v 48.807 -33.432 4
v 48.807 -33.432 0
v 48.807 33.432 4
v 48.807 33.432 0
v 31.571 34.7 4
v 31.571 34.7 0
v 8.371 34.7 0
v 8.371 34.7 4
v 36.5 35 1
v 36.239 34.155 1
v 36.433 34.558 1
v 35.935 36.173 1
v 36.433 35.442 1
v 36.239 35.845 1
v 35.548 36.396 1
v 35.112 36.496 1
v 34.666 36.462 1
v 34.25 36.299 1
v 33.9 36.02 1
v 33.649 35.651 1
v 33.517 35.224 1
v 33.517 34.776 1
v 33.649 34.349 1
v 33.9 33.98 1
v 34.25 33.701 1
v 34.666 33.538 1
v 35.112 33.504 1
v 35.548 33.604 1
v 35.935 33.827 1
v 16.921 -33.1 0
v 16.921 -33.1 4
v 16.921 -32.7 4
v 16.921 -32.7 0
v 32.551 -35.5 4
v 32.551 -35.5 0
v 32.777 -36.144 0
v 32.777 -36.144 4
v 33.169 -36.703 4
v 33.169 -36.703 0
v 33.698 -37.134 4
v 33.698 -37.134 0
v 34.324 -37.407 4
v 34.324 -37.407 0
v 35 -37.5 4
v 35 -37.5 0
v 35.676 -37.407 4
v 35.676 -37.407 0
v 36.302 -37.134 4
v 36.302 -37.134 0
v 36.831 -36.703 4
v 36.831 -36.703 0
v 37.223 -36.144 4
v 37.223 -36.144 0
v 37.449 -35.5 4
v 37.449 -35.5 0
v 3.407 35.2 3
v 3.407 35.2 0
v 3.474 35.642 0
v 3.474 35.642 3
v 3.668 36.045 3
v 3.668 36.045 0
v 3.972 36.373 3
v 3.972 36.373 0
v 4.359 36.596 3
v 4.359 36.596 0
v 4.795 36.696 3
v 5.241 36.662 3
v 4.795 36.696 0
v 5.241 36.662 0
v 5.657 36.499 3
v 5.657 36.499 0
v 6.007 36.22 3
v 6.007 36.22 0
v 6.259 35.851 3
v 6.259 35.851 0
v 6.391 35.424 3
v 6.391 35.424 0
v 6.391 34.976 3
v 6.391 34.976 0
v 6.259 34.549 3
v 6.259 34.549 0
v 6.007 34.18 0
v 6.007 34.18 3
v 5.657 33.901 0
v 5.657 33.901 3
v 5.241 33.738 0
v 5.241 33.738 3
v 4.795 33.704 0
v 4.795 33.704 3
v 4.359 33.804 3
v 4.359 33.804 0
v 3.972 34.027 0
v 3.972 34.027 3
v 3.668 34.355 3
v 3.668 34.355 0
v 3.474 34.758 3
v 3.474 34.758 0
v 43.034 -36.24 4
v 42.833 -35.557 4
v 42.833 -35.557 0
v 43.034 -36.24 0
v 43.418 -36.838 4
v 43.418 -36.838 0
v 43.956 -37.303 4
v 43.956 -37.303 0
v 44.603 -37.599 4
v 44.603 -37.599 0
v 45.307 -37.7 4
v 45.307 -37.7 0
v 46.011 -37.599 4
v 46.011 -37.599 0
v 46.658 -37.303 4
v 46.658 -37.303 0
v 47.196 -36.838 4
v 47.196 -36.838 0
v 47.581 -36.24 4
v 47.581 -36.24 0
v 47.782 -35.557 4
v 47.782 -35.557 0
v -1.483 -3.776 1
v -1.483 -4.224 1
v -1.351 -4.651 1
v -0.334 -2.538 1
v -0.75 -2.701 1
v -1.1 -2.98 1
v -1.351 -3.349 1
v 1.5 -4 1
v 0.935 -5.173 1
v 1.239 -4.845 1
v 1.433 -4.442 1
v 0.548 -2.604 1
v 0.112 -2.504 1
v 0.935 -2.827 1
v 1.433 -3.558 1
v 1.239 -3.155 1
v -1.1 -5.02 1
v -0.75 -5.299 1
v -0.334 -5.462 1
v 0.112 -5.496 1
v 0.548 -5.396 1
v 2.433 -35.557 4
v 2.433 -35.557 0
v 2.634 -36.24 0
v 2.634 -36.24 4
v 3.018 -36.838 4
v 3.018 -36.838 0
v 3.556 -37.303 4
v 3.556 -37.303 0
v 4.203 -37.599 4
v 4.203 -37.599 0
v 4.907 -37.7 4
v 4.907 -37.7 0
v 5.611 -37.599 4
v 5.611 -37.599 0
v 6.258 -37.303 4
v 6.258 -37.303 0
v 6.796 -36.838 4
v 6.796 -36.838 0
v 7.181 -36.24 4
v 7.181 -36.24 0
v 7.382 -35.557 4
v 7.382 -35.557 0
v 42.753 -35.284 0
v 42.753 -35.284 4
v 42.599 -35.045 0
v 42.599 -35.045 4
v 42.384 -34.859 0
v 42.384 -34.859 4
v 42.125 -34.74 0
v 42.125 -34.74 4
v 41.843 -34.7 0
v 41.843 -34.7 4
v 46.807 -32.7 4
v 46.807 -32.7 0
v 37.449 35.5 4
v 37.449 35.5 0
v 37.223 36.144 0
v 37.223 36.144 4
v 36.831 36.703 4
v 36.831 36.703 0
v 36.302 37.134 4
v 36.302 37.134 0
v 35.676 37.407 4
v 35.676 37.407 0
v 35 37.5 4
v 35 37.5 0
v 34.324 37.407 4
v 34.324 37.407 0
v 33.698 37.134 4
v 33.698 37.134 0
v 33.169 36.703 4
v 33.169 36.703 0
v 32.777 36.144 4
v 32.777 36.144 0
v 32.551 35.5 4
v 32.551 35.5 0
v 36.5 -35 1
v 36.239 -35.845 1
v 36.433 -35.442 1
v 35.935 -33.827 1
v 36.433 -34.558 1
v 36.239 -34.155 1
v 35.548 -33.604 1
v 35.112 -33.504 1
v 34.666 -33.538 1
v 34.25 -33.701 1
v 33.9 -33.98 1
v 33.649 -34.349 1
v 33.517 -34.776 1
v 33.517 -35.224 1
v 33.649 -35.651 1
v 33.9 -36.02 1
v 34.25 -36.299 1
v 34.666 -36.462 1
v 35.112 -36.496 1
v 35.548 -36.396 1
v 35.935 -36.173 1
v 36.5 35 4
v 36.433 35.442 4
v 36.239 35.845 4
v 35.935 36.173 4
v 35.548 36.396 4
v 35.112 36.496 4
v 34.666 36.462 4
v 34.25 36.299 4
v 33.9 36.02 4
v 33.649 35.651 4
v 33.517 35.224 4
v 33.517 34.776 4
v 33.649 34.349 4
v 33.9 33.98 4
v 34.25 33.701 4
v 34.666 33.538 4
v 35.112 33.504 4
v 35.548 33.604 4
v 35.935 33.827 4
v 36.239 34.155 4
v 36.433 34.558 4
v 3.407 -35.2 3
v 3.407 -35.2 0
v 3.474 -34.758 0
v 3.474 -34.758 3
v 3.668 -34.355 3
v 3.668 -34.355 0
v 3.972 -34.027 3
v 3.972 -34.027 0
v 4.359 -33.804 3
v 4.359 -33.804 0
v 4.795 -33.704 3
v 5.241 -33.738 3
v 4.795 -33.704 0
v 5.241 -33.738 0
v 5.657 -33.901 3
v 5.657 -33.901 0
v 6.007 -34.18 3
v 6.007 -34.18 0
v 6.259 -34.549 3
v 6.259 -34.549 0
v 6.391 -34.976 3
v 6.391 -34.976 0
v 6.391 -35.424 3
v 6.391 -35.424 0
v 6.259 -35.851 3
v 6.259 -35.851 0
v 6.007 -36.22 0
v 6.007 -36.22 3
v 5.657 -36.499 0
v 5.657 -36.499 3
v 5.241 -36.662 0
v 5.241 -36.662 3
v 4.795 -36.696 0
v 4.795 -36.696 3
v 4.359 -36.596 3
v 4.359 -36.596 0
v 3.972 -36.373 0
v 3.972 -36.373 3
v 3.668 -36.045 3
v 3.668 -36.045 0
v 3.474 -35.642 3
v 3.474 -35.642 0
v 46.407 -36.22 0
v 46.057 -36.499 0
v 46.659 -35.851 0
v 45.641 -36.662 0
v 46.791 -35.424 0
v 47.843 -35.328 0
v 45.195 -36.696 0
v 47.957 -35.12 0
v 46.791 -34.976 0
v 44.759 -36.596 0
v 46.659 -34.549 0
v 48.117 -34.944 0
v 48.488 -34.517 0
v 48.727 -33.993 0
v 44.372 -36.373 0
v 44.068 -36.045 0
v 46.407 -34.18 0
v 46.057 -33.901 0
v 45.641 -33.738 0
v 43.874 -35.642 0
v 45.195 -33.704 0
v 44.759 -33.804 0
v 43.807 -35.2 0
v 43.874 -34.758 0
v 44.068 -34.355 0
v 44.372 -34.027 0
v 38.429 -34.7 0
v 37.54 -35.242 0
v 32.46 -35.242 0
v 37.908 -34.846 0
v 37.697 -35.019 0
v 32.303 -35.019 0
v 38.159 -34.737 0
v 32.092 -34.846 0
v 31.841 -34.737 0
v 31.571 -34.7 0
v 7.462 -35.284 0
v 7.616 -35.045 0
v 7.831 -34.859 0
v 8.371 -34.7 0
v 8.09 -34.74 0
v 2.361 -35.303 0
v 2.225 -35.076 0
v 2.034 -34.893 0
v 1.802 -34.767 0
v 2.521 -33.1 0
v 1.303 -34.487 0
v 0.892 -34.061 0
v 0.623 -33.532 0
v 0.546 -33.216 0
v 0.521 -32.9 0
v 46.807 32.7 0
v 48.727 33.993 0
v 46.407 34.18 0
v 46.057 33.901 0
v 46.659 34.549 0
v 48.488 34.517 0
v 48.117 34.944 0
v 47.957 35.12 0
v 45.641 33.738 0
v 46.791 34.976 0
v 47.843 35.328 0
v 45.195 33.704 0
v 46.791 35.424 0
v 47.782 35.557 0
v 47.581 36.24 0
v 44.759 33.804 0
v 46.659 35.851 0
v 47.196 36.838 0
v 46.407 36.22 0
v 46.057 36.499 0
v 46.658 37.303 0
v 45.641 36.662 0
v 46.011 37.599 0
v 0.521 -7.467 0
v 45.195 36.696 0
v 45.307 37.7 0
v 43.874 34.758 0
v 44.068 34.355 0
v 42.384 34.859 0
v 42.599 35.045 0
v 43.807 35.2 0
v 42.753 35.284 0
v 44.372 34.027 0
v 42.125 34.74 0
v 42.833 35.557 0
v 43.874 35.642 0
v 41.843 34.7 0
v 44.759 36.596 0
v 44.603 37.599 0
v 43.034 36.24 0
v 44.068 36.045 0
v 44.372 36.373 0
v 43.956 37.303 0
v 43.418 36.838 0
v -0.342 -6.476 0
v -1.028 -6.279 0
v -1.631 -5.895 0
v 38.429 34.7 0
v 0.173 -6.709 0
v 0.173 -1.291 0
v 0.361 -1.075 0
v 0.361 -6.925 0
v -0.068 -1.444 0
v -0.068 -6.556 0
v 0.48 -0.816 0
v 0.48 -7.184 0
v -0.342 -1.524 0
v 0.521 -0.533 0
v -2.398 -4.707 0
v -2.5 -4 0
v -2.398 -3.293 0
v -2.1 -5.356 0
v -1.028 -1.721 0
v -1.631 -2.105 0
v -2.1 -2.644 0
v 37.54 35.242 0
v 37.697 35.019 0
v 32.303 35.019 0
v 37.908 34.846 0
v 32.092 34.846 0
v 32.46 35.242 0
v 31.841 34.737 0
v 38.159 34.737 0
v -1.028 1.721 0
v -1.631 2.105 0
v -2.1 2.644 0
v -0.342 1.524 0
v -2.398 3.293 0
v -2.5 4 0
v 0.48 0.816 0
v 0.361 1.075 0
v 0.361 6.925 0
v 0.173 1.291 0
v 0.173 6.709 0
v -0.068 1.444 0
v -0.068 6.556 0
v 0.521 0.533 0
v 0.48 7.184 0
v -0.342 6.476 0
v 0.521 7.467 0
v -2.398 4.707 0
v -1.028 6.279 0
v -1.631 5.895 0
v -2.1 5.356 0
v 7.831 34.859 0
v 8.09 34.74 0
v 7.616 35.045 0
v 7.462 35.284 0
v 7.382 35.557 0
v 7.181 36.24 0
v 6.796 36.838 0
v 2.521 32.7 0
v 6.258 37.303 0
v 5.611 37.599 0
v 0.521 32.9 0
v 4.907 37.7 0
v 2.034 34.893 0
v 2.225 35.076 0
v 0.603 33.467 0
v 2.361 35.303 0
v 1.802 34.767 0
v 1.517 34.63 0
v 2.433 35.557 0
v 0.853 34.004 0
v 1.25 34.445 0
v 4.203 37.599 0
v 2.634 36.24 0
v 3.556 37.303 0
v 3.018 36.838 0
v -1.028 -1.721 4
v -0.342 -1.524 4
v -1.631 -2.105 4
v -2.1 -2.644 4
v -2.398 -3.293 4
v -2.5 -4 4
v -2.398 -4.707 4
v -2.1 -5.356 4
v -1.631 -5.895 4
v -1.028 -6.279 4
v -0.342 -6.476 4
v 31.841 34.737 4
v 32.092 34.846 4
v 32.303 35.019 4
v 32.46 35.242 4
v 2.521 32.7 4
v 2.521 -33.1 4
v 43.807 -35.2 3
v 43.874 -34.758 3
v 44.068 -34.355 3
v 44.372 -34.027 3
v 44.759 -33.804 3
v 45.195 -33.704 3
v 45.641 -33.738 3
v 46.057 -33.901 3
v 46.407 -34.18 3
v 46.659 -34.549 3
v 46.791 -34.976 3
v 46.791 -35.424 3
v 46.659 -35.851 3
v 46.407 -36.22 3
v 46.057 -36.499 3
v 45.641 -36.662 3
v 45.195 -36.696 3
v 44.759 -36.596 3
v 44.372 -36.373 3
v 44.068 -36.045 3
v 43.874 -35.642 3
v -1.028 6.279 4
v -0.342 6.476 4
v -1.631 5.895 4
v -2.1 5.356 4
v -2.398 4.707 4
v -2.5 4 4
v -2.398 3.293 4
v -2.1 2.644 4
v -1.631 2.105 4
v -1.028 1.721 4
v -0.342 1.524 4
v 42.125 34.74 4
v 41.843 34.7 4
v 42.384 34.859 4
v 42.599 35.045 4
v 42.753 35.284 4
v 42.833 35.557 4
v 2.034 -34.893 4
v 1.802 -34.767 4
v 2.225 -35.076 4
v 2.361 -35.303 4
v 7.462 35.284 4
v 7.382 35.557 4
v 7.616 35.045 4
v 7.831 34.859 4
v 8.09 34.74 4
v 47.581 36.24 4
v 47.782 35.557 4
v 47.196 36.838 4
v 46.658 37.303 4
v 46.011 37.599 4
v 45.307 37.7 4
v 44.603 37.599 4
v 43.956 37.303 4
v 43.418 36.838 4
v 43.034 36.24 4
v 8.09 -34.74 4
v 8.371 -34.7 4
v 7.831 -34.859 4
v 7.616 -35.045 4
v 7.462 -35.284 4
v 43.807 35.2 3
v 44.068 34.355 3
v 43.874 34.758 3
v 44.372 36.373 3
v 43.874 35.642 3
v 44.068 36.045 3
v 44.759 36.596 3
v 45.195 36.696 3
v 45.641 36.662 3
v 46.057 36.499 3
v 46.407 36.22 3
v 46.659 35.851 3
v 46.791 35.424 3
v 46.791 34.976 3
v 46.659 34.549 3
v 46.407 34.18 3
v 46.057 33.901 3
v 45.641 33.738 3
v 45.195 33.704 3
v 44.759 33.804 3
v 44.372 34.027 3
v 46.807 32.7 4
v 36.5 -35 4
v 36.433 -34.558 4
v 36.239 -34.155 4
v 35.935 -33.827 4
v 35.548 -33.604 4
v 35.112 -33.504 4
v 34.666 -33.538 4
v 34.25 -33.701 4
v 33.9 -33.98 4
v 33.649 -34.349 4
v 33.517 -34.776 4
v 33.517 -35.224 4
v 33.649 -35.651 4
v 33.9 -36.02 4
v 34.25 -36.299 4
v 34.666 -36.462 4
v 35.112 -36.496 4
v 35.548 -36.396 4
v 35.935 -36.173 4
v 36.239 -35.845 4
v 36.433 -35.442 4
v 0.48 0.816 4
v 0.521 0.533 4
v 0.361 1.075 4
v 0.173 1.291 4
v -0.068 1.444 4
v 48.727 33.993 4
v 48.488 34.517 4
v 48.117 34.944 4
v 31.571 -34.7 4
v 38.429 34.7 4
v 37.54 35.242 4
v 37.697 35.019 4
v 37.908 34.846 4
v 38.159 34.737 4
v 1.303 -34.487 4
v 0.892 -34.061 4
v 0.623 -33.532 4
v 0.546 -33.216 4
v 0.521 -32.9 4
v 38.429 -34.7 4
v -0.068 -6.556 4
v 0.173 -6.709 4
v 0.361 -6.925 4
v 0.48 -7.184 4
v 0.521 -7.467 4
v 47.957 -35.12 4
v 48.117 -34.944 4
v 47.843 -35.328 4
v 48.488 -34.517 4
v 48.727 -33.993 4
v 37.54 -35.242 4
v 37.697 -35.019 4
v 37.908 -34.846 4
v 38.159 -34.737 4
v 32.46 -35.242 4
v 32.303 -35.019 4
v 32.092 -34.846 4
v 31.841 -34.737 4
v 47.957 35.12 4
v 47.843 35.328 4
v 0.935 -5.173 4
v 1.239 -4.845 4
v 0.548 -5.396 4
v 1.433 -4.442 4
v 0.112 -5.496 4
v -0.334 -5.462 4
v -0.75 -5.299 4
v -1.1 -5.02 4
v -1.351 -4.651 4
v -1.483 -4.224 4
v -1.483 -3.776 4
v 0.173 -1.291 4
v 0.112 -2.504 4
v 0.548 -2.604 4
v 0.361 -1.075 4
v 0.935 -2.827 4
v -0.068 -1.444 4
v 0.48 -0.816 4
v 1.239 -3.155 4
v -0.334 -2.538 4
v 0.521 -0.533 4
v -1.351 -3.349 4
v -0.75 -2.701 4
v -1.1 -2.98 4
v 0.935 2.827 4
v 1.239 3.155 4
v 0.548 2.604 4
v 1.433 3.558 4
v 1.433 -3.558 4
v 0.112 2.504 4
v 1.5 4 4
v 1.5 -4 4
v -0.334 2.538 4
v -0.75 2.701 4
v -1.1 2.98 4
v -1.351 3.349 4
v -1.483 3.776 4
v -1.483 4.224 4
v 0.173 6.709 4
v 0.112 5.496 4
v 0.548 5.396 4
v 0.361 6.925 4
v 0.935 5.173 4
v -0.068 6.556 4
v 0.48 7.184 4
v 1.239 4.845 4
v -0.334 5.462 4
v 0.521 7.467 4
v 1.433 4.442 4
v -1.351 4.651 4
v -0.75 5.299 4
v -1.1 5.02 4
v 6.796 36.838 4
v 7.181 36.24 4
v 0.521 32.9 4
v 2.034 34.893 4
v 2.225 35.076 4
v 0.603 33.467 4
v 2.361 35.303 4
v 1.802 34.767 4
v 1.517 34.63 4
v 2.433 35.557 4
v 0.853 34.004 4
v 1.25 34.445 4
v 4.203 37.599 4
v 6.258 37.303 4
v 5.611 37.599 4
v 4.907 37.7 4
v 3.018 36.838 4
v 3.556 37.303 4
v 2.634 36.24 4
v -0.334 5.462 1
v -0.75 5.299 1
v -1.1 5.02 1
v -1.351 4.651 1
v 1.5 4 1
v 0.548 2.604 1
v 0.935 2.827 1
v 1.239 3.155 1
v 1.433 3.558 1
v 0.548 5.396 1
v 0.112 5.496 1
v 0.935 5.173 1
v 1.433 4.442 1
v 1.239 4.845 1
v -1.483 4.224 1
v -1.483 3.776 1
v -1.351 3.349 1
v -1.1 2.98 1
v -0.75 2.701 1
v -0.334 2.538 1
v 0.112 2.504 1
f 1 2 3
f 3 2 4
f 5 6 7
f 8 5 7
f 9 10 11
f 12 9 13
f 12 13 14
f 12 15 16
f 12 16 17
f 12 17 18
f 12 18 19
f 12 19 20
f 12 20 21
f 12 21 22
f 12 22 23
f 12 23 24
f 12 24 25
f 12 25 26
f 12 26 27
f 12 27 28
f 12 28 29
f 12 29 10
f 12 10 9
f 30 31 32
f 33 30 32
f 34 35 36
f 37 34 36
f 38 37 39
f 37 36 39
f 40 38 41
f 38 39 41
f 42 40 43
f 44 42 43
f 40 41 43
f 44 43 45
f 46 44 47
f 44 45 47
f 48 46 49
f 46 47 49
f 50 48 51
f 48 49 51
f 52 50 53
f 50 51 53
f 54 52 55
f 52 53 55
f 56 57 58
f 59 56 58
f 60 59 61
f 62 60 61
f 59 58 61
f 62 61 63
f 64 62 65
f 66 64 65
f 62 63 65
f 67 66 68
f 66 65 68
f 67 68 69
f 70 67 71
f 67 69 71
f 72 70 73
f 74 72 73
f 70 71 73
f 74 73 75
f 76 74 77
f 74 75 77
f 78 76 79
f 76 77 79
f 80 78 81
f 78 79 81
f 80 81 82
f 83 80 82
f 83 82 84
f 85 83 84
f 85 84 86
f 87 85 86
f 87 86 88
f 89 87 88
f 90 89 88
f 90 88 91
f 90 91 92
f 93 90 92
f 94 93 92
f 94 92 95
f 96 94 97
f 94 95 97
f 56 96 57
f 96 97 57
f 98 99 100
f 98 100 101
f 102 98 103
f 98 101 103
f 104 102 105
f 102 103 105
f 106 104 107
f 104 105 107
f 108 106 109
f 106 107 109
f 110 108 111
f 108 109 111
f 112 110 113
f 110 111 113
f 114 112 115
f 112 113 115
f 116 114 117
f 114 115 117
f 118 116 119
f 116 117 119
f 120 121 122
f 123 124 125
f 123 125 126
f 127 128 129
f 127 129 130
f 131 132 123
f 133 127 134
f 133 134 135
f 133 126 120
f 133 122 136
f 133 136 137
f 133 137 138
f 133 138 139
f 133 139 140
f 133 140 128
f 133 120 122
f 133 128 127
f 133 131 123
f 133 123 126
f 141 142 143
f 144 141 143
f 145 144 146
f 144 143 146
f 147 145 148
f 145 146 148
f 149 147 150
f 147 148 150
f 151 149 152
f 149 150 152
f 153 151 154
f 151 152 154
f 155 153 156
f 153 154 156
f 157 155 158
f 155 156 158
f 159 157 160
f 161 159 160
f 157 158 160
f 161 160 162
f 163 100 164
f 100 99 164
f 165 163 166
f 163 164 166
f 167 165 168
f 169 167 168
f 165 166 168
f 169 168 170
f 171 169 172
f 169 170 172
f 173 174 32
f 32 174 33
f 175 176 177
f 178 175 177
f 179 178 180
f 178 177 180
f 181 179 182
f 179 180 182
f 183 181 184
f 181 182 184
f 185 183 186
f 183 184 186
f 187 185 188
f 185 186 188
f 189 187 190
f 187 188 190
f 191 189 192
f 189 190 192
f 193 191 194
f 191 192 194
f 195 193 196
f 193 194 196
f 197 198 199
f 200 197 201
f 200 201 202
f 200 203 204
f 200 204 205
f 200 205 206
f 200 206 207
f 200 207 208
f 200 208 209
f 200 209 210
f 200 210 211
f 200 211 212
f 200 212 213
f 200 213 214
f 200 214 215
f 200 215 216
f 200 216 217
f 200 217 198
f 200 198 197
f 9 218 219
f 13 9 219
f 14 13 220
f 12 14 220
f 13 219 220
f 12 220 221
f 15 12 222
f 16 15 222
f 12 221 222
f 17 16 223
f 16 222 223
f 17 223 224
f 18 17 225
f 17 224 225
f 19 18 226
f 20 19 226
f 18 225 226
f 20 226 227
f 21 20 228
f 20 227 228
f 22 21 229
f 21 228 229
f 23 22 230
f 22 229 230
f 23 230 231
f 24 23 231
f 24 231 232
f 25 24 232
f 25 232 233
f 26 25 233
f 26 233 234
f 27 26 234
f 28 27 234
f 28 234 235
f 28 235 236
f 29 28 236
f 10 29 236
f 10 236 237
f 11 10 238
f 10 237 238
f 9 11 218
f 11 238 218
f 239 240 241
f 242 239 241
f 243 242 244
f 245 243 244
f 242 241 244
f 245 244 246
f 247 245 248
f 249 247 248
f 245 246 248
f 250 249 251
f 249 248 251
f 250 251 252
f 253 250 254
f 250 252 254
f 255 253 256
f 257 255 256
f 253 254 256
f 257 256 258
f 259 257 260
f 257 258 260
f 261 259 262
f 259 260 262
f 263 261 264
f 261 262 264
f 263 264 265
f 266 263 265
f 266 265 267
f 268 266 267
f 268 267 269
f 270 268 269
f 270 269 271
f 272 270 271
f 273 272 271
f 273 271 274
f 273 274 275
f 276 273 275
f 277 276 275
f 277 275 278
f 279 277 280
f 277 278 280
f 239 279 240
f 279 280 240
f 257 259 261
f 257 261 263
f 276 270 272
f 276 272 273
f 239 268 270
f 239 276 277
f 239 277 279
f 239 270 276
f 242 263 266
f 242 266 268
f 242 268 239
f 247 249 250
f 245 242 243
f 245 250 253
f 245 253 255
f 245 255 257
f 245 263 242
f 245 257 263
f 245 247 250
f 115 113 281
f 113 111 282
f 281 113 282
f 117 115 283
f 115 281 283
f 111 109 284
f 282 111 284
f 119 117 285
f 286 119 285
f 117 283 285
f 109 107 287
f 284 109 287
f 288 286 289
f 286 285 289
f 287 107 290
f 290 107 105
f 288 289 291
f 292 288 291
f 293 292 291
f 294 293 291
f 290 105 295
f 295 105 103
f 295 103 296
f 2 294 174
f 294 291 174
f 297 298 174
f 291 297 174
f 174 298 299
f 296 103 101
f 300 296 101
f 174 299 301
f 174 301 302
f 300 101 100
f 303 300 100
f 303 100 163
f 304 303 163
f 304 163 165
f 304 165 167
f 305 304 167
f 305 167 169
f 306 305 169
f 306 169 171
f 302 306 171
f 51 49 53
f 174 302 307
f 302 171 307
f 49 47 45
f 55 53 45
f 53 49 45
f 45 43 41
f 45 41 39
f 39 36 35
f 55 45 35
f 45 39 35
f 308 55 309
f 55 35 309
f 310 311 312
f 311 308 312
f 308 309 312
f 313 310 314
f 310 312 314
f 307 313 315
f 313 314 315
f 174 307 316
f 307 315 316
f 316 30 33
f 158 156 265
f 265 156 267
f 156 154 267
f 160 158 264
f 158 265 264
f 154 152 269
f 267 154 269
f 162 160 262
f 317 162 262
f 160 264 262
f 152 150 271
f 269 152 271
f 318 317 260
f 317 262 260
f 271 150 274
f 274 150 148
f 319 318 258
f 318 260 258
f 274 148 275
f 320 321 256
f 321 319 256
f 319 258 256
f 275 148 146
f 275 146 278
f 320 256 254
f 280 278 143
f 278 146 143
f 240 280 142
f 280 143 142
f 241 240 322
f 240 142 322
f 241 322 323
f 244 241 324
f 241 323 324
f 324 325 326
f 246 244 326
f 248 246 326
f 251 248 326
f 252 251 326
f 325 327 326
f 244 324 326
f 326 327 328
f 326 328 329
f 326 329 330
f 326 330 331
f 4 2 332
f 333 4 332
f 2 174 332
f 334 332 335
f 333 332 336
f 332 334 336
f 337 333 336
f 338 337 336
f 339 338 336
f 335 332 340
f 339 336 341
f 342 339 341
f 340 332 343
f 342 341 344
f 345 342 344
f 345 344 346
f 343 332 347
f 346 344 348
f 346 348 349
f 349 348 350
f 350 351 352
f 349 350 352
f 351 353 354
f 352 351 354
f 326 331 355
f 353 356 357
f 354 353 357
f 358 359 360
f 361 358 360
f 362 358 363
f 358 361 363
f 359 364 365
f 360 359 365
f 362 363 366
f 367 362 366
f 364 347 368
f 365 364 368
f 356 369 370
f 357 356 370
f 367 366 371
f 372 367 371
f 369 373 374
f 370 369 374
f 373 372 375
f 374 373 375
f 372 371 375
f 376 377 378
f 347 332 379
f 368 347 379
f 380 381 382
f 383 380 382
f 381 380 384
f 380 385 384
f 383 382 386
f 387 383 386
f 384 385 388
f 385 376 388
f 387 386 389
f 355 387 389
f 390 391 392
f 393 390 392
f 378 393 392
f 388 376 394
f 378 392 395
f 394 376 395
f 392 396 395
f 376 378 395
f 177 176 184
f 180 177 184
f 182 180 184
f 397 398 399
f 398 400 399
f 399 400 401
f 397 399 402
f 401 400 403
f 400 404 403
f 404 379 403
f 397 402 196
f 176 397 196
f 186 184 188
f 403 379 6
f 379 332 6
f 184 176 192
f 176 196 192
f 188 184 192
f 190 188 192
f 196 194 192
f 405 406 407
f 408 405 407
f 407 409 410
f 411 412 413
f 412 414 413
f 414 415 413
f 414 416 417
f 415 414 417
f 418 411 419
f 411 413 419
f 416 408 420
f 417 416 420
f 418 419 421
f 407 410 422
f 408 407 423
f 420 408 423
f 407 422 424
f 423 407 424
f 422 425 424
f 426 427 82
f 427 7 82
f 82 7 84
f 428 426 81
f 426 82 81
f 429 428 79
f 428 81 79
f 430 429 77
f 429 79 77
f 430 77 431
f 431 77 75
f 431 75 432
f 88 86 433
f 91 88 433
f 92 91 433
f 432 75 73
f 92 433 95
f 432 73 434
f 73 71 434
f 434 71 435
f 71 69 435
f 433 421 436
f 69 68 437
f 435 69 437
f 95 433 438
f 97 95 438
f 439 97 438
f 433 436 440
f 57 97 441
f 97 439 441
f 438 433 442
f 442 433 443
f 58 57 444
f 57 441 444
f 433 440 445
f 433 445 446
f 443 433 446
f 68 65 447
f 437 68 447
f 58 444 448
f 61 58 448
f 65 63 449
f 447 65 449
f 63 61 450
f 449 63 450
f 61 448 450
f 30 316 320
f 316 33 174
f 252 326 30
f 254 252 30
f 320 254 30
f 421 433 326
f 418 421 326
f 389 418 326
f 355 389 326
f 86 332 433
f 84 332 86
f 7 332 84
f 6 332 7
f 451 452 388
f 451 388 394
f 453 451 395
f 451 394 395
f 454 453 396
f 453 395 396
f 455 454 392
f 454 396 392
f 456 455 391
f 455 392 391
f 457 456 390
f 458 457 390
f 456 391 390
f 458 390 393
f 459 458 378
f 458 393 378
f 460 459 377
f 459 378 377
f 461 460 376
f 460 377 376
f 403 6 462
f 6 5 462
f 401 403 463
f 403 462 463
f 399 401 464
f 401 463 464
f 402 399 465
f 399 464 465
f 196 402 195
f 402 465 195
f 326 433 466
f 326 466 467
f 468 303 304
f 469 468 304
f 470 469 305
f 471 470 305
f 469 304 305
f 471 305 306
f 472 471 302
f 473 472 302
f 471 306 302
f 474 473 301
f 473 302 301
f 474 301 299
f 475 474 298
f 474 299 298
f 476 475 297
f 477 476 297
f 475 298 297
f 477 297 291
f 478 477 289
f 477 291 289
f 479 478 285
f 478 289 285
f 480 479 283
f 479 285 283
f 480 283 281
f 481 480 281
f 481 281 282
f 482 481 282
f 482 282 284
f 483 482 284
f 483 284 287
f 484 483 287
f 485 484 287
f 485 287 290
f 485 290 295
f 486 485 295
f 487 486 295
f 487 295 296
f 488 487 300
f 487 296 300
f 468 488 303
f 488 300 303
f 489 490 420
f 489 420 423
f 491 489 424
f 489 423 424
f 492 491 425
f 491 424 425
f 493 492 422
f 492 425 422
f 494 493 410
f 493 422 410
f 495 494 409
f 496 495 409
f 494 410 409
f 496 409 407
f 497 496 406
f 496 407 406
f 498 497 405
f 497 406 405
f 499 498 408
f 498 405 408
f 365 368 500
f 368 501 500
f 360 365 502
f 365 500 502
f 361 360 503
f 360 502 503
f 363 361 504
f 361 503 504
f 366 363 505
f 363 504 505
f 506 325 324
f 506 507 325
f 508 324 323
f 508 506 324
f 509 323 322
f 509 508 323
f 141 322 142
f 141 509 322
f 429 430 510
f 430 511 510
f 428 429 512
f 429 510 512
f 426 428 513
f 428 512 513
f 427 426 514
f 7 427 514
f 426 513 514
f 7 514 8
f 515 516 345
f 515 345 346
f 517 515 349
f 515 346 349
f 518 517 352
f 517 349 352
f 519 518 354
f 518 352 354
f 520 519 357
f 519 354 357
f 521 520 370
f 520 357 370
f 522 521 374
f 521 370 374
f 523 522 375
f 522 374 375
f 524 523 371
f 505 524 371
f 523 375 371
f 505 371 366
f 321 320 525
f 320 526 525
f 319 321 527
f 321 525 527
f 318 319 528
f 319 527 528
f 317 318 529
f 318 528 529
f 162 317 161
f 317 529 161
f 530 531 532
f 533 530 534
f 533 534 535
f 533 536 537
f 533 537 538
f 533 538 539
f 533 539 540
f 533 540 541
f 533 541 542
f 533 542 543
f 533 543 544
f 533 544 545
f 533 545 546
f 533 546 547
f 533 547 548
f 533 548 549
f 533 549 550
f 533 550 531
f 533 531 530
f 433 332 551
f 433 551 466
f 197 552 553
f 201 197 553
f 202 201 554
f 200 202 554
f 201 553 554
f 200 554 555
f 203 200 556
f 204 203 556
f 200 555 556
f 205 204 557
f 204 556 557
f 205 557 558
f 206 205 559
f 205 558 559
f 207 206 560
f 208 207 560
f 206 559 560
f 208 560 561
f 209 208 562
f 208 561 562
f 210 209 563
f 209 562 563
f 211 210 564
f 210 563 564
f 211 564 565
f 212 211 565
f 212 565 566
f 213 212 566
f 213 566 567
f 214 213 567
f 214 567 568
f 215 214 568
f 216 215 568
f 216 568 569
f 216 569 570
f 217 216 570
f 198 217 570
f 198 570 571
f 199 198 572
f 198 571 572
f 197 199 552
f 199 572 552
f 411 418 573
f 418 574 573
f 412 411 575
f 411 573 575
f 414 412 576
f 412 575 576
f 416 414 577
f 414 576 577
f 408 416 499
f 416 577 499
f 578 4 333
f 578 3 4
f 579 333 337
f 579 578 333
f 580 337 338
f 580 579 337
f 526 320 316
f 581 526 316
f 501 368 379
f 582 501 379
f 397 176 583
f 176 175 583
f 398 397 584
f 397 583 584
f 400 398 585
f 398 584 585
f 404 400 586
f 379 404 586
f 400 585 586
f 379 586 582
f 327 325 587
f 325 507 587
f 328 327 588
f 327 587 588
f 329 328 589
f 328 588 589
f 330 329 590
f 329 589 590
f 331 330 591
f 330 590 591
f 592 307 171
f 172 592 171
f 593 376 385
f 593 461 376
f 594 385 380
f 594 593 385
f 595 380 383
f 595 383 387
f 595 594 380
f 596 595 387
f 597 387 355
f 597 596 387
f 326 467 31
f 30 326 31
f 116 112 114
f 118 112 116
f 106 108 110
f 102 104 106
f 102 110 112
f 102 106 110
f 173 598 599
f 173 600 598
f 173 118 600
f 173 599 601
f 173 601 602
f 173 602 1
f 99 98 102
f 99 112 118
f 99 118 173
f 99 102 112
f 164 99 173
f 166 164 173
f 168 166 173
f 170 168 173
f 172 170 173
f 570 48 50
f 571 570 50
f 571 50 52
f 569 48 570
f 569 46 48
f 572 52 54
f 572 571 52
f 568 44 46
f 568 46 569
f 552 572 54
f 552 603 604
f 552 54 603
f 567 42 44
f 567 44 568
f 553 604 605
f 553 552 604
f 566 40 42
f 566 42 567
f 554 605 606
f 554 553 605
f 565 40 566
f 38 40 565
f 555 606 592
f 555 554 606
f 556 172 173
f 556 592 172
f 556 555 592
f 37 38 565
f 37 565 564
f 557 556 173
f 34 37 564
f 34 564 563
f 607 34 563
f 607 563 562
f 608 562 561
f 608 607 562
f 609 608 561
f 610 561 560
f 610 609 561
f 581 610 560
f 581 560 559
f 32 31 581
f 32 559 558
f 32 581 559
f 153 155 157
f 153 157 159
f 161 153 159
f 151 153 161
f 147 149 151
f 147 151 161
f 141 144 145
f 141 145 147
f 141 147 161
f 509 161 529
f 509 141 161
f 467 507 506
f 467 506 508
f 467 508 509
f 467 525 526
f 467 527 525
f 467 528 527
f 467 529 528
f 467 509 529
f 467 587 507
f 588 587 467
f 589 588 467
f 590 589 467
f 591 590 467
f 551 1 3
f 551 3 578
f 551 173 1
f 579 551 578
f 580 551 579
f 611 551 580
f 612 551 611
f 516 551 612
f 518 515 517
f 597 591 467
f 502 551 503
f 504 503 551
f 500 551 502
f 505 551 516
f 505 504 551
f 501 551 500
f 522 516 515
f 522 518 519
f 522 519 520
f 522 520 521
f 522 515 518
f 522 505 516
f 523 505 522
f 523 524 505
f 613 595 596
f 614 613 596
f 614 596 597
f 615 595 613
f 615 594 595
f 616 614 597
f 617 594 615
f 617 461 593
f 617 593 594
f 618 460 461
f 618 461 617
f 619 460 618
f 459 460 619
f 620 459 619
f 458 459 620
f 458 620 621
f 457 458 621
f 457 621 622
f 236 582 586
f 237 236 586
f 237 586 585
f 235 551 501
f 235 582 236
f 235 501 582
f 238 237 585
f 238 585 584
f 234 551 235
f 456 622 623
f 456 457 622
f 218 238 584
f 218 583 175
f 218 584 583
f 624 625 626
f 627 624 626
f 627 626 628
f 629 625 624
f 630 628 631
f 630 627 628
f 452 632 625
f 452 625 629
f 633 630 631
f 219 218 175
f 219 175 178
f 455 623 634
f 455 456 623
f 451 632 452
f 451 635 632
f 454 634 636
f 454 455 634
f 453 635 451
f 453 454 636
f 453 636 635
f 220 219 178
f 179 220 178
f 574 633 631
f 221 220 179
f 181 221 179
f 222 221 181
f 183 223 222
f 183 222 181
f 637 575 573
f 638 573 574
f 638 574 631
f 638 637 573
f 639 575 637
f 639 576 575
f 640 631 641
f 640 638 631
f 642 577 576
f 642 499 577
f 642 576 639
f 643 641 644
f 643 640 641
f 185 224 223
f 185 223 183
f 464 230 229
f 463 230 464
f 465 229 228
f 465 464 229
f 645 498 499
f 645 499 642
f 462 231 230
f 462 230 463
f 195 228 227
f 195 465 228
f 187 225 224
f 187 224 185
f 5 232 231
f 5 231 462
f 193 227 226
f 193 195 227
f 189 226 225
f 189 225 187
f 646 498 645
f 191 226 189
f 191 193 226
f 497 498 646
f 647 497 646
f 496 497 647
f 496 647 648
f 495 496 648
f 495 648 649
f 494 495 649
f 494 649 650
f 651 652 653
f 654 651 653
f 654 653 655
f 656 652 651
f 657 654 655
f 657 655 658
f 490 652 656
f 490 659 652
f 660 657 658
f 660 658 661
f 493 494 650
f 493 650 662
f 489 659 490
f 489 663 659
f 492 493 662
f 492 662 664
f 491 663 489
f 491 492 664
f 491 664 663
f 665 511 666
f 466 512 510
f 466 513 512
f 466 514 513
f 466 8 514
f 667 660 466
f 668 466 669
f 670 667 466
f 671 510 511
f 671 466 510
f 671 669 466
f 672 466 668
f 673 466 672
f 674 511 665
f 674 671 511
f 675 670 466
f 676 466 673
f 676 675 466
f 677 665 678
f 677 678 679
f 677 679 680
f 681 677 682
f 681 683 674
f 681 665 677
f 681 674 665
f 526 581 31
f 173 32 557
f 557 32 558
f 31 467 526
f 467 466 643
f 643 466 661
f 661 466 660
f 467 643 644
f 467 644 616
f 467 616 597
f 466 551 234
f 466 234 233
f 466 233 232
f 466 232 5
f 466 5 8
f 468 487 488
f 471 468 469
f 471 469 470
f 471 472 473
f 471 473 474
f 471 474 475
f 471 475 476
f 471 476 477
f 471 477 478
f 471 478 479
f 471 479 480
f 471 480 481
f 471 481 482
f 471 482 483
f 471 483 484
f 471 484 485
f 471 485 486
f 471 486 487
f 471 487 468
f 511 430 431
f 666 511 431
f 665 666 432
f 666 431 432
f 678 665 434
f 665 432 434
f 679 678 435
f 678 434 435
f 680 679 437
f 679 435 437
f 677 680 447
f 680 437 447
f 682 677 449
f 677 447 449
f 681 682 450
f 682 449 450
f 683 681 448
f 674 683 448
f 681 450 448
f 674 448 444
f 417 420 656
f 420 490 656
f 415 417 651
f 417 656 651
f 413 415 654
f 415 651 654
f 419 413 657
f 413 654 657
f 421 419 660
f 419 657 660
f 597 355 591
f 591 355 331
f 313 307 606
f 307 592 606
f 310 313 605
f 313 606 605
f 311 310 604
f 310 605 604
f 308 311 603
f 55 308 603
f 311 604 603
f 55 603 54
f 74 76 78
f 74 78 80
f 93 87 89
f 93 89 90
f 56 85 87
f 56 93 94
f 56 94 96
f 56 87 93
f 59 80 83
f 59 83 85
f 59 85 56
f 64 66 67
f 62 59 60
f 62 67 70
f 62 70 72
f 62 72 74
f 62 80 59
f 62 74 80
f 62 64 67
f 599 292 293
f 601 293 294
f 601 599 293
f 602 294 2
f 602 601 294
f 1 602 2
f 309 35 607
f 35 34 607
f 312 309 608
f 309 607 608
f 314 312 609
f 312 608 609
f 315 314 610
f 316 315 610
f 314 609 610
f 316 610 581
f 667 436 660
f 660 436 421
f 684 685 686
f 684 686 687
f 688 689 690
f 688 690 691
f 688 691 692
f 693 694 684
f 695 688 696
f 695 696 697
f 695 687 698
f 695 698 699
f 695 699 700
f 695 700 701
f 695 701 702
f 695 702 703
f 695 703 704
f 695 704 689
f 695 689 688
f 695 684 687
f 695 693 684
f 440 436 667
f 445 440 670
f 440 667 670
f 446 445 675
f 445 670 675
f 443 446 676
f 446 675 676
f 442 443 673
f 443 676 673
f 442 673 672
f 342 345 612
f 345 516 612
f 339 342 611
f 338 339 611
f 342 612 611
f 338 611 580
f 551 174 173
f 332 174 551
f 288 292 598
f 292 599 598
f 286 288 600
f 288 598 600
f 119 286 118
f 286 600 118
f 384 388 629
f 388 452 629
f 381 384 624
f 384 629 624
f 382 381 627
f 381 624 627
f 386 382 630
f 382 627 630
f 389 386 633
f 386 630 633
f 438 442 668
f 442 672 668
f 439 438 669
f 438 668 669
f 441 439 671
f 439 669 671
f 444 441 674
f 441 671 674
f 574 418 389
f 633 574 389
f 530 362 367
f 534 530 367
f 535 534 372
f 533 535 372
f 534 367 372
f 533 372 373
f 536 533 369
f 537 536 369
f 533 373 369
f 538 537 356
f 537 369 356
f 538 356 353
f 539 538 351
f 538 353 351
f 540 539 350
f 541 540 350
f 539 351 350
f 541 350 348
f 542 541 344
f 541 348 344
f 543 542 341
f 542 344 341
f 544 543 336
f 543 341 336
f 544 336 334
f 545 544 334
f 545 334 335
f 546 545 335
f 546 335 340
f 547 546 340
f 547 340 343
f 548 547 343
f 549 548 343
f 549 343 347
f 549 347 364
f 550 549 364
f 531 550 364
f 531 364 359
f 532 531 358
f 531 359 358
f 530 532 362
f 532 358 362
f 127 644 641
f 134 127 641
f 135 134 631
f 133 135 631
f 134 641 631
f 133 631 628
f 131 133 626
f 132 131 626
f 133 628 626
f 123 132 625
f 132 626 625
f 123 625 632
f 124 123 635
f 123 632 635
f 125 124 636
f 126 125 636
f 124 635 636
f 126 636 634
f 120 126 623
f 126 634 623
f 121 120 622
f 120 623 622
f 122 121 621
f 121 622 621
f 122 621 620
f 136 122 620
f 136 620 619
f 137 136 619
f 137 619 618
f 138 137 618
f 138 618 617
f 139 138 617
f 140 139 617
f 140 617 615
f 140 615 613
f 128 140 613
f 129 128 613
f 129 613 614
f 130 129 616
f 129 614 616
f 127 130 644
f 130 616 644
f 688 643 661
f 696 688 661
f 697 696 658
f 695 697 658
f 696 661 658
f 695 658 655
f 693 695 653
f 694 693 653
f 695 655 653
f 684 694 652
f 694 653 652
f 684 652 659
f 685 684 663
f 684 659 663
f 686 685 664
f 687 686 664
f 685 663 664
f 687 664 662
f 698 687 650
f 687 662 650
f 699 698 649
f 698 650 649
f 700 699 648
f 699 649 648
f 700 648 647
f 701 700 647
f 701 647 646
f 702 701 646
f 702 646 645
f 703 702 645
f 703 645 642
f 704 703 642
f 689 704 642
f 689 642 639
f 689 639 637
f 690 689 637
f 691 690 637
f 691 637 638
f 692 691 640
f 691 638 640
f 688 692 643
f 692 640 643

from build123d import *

# Parameters (mm, degrees)
BOSS_EXTRUDE1_DEPTH = 4
SKETCH4_R           = 1.5
CUT_EXTRUDE1_DEPTH  = 3
SKETCH5_R           = 1.5
CUT_EXTRUDE2_DEPTH  = 3
SKETCH6_W           = 14.4
SKETCH6_H           = 0.4
CUT_EXTRUDE3_DEPTH  = 4
FILLET1_R           = 1
FILLET2_R           = 2


with BuildPart() as part:
    # Sketch3 → Boss-Extrude1 (new body)
    with BuildSketch(Plane(origin=(0, 0, 0), x_dir=(0, 1, 0), z_dir=(0, 0, 1))):
        with BuildLine():
            Line((-34.7, -0.521026003), (-34.7, -2.457826354))
            ThreePointArc((-34.7, -2.457826354), (-37.7, -4.907316097), (-34.7, -7.35680584))
            Line((-34.7, -7.35680584), (-34.7, -9.880280288))
            Line((-34.7, -9.880280288), (-34.7, -32.518065271))
            ThreePointArc((-34.7, -32.518065271), (-37.5, -35), (-34.7, -37.481934729))
            Line((-34.7, -37.481934729), (-34.7, -42.857826354))
            ThreePointArc((-34.7, -42.857826354), (-37.7, -45.307316097), (-34.7, -47.75680584))
            Line((-34.7, -47.75680584), (-34.7, -48.807316097))
            Line((-34.7, -48.807316097), (34.7, -48.807316097))
            Line((34.7, -48.807316097), (34.7, -47.75680584))
            ThreePointArc((34.7, -47.75680584), (37.7, -45.307316097), (34.7, -42.857826354))
            Line((34.7, -42.857826354), (34.7, -37.481934729))
            ThreePointArc((34.7, -37.481934729), (37.5, -35), (34.7, -32.518065271))
            Line((34.7, -32.518065271), (34.7, -7.35680584))
            ThreePointArc((34.7, -7.35680584), (37.7, -4.907316097), (34.7, -2.457826354))
            Line((34.7, -2.457826354), (34.7, -0.521026003))
            Line((34.7, -0.521026003), (6.445103659, -0.521026003))
            ThreePointArc((6.445103659, -0.521026003), (4, 2.5), (1.554896341, -0.521026003))
            Line((1.554896341, -0.521026003), (-1.554896341, -0.521026003))
            ThreePointArc((-1.554896341, -0.521026003), (-4, 2.5), (-6.445103659, -0.521026003))
            Line((-6.445103659, -0.521026003), (-34.7, -0.521026003))
        make_face()
        Polygon((-32.7, -9.880280288), (-32.7, -46.807316097), (32.7, -46.807316097), (32.7, -2.521026003), (-32.7, -2.521026003), align=None, mode=Mode.SUBTRACT)
    extrude(amount=BOSS_EXTRUDE1_DEPTH)

    # Sketch4 → Cut-Extrude1 (cut)
    with BuildSketch(Plane.XY.offset(4)):
        with Locations((0, 4)):
            Circle(SKETCH4_R)
        with Locations((0, -4)):
            Circle(SKETCH4_R)
        with Locations((35, -35)):
            Circle(SKETCH4_R)
        with Locations((35, 35)):
            Circle(SKETCH4_R)
    extrude(amount=-CUT_EXTRUDE1_DEPTH, mode=Mode.SUBTRACT)

    # Sketch5 → Cut-Extrude2 (cut)
    with BuildSketch(Plane(origin=(0, 0, 0), x_dir=(1, 0, 0), z_dir=(0, 0, -1))):
        with Locations(Location((4.907316097, 35.2, 0), (0, 0, 180))):
            Circle(SKETCH5_R)
        with Locations(Location((45.307316097, 35.2, 0), (0, 0, 180))):
            Circle(SKETCH5_R)
        with Locations(Location((45.307316097, -35.2, 0), (0, 0, 180))):
            Circle(SKETCH5_R)
        with Locations(Location((4.907316097, -35.2, 0), (0, 0, 180))):
            Circle(SKETCH5_R)
    extrude(amount=-CUT_EXTRUDE2_DEPTH, mode=Mode.SUBTRACT)

    # Sketch6 → Cut-Extrude3 (cut)
    with BuildSketch(Plane.XY.offset(4)):
        with Locations((9.721026003, -32.9)):
            Rectangle(SKETCH6_W, SKETCH6_H)
    extrude(amount=-CUT_EXTRUDE3_DEPTH, mode=Mode.SUBTRACT)

    # Fillet1
    fillet1_edges = [part.edges().sort_by_distance(p)[0] for p in [
        (2.457826354, -34.7, 2),
        (0.521026003, -6.445103659, 2),
        (0.521026003, -1.554896341, 2),
        (0.521026003, 1.554896341, 2),
        (0.521026003, 6.445103659, 2),
        (2.457826354, 34.7, 2),
        (7.35680584, 34.7, 2),
        (32.518065271, 34.7, 2),
        (37.481934729, 34.7, 2),
        (42.857826354, 34.7, 2),
        (47.75680584, 34.7, 2),
        (47.75680584, -34.7, 2),
        (42.857826354, -34.7, 2),
        (37.481934729, -34.7, 2),
        (32.518065271, -34.7, 2),
        (7.35680584, -34.7, 2),
    ]]
    fillet(fillet1_edges, radius=FILLET1_R)

    # Fillet2
    fillet2_edges = [part.edges().sort_by_distance(p)[0] for p in [
        (0.521026003, 34.7, 2),
        (48.807316097, 34.7, 2),
        (48.807316097, -34.7, 2),
        (0.521026003, -34.7, 2),
    ]]
    fillet(fillet2_edges, radius=FILLET2_R)


solid = part.part
